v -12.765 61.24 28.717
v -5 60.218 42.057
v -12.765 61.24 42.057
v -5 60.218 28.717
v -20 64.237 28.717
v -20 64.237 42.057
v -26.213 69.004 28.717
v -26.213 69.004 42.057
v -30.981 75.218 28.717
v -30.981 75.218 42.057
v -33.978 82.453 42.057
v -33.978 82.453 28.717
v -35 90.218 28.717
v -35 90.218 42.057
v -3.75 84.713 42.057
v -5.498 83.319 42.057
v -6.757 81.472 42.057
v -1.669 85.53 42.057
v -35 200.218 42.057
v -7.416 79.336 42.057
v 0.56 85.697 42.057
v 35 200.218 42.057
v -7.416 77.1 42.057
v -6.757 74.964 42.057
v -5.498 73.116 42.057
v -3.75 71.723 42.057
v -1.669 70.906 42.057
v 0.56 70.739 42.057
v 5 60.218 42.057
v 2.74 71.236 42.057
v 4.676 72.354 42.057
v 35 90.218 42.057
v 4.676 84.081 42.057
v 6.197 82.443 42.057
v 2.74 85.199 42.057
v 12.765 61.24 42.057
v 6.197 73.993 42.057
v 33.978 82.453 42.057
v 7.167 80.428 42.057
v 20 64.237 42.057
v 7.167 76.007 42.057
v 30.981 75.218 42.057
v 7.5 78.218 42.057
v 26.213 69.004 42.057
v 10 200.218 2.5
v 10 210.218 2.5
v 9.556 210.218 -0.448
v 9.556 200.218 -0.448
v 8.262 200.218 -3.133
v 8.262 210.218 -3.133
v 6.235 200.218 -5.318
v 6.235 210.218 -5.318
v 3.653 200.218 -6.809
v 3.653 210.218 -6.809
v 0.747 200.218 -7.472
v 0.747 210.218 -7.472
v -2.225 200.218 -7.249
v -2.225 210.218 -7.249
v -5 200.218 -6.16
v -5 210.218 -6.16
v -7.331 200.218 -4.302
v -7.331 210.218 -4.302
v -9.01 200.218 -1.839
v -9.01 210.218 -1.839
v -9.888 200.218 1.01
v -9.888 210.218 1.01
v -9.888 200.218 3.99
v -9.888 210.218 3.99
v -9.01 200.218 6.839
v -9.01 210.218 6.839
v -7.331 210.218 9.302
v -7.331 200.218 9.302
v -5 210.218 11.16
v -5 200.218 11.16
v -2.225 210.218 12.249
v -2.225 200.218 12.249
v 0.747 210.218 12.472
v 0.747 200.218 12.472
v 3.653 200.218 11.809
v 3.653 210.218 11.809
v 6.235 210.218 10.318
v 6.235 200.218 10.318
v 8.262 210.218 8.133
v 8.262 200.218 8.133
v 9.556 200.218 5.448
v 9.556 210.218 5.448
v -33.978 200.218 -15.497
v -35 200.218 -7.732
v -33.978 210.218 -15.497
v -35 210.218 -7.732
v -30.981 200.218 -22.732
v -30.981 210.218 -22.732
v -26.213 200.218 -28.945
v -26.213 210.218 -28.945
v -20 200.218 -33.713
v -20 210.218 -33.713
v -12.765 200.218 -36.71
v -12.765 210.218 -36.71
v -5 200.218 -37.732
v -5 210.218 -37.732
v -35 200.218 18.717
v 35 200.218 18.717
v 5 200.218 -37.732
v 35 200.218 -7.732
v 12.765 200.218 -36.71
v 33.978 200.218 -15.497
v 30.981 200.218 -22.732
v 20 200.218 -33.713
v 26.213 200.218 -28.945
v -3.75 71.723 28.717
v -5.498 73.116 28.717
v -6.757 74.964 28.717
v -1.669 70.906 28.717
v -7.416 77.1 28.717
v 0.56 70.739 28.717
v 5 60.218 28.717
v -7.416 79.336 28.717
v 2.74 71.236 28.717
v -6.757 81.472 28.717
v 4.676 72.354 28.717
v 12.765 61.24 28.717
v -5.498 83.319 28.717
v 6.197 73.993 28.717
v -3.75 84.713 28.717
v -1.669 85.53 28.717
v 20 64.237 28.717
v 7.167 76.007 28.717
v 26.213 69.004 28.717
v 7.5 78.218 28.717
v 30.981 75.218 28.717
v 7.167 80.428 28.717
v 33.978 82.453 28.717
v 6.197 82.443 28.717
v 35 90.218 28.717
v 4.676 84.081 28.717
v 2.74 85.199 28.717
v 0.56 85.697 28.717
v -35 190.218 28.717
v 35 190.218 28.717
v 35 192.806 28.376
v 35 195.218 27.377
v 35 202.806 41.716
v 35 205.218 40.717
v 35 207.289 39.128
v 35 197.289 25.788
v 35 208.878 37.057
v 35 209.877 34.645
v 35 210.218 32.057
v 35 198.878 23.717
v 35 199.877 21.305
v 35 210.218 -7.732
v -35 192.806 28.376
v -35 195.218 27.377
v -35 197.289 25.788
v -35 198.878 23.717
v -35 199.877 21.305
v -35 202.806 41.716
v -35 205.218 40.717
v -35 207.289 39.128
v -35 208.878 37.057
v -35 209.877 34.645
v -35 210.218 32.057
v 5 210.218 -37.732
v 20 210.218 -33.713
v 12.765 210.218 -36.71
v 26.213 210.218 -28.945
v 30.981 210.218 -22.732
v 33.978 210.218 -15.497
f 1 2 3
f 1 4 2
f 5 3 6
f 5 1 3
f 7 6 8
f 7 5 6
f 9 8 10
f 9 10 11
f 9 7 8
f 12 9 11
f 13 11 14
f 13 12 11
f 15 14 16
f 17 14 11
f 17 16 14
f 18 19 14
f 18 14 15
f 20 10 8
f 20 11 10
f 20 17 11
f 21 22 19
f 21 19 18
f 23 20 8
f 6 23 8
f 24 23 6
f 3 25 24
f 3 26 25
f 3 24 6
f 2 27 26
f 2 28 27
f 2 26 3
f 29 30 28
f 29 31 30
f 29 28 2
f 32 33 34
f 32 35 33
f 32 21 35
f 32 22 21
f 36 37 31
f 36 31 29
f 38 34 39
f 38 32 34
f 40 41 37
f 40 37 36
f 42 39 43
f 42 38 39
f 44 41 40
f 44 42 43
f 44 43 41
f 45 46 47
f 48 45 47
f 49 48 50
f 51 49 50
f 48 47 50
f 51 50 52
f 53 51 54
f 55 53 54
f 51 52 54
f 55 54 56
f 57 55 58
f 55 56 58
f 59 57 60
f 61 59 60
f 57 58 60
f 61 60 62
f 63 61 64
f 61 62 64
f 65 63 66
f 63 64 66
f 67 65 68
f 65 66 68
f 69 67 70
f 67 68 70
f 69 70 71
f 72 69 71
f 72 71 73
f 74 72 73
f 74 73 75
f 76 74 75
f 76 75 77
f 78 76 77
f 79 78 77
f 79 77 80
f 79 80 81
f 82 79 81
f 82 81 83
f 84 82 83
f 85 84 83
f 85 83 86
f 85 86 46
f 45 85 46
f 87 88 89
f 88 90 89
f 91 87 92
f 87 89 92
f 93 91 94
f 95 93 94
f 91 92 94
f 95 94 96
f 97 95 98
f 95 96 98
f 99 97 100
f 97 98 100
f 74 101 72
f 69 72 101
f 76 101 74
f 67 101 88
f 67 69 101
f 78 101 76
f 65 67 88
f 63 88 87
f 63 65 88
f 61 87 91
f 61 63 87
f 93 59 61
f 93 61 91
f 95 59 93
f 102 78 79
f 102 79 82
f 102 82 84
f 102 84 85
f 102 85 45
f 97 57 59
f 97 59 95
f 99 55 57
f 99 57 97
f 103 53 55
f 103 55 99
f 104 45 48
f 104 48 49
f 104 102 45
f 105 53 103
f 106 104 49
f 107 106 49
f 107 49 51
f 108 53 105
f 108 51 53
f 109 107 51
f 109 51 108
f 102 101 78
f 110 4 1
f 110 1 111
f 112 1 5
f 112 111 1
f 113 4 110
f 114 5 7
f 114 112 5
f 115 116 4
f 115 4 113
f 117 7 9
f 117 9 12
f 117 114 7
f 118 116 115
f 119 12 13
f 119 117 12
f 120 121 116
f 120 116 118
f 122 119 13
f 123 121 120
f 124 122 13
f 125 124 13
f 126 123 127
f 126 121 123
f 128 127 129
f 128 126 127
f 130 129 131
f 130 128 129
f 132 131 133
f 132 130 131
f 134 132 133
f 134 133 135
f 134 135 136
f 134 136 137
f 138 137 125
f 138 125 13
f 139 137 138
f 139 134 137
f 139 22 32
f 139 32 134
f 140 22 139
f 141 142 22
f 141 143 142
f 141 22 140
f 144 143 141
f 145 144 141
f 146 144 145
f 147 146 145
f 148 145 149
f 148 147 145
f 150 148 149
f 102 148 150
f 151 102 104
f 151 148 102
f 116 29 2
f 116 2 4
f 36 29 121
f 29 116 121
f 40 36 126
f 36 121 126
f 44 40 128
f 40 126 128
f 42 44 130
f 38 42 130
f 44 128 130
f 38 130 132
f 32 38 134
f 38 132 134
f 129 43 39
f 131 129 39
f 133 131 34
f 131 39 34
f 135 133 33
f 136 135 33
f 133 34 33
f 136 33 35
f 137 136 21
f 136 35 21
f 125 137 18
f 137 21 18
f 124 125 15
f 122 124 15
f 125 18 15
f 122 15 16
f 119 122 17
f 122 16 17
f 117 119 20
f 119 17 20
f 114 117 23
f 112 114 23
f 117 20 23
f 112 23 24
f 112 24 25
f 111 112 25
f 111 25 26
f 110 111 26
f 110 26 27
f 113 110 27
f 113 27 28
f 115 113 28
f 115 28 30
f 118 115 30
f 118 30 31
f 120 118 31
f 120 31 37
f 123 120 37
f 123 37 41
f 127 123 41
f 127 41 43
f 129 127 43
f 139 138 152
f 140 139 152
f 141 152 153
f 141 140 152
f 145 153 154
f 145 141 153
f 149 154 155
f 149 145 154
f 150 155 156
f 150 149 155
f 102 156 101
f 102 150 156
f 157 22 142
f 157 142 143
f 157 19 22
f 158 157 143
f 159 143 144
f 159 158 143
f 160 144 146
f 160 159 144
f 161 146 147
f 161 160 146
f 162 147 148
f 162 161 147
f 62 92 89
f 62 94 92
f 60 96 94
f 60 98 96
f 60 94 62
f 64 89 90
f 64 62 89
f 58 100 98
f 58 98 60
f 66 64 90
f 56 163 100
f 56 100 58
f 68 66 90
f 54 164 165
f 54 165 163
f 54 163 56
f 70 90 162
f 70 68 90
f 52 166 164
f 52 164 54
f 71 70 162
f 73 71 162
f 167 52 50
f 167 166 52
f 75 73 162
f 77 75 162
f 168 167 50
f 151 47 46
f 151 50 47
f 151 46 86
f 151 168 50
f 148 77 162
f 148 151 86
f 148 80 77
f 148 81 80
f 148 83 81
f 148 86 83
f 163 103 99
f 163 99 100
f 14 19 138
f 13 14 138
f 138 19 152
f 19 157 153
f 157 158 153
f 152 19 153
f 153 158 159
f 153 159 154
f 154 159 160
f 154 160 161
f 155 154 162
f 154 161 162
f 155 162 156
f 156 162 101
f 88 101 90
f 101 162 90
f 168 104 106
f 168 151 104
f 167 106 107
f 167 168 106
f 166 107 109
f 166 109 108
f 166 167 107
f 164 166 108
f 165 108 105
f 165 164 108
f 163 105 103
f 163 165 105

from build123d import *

# Parameters (mm, degrees)
BOSS_EXTRUDE1_DEPTH      = 35
BOSS_EXTRUDE1_DEPTH_BACK = 35
SKETCH2_R                = 10
CUT_EXTRUDE1_DEPTH       = 35
SKETCH3_R                = 7.5
CUT_EXTRUDE2_DEPTH       = 80.78895104
FILLET1_R                = 30
FILLET2_R                = 10


with BuildPart() as part:
    # Sketch1 → Boss-Extrude1 (new body, two sides)
    with BuildSketch(Plane(origin=(0, 0, 0), x_dir=(0, 0, -1), z_dir=(1, 0, 0))) as boss_extrude1_sk:
        Polygon((-42.056921018, 166.399972685), (-42.056921018, 60.21769331), (-28.717037647, 60.21769331), (-28.717037647, 200.21769331), (37.732030022, 200.21769331), (37.732030022, 210.21769331), (-42.056921018, 210.21769331), align=None)
    extrude(amount=BOSS_EXTRUDE1_DEPTH)
    extrude(boss_extrude1_sk.sketch, amount=-BOSS_EXTRUDE1_DEPTH_BACK)

    # Sketch2 → Cut-Extrude1 (cut)
    with BuildSketch(Plane(origin=(0, 210.21769331, 0), x_dir=(1, 0, 0), z_dir=(0, 1, 0))):
        with Locations((0, -2.5)):
            Circle(SKETCH2_R)
    extrude(amount=-CUT_EXTRUDE1_DEPTH, mode=Mode.SUBTRACT)

    # Sketch3 → Cut-Extrude2 (cut, through all)
    with BuildSketch(Plane.XY.offset(42.056921018)):
        with Locations((0, 78.21769331)):
            Circle(SKETCH3_R)
    extrude(amount=-CUT_EXTRUDE2_DEPTH, mode=Mode.SUBTRACT)

    # Fillet1
    fillet1_edges = [part.edges().sort_by_distance(p)[0] for p in [
        (-35, 60.21769331, 35.386979332),
        (35, 60.21769331, 35.386979332),
        (35, 205.21769331, -37.732030022),
        (-35, 205.21769331, -37.732030022),
    ]]
    fillet(fillet1_edges, radius=FILLET1_R)

    # Fillet2
    fillet2_edges = [part.edges().sort_by_distance(p)[0] for p in [
        (0, 210.21769331, 42.056921018),
        (0, 200.21769331, 28.717037647),
    ]]
    fillet(fillet2_edges, radius=FILLET2_R)


solid = part.part
